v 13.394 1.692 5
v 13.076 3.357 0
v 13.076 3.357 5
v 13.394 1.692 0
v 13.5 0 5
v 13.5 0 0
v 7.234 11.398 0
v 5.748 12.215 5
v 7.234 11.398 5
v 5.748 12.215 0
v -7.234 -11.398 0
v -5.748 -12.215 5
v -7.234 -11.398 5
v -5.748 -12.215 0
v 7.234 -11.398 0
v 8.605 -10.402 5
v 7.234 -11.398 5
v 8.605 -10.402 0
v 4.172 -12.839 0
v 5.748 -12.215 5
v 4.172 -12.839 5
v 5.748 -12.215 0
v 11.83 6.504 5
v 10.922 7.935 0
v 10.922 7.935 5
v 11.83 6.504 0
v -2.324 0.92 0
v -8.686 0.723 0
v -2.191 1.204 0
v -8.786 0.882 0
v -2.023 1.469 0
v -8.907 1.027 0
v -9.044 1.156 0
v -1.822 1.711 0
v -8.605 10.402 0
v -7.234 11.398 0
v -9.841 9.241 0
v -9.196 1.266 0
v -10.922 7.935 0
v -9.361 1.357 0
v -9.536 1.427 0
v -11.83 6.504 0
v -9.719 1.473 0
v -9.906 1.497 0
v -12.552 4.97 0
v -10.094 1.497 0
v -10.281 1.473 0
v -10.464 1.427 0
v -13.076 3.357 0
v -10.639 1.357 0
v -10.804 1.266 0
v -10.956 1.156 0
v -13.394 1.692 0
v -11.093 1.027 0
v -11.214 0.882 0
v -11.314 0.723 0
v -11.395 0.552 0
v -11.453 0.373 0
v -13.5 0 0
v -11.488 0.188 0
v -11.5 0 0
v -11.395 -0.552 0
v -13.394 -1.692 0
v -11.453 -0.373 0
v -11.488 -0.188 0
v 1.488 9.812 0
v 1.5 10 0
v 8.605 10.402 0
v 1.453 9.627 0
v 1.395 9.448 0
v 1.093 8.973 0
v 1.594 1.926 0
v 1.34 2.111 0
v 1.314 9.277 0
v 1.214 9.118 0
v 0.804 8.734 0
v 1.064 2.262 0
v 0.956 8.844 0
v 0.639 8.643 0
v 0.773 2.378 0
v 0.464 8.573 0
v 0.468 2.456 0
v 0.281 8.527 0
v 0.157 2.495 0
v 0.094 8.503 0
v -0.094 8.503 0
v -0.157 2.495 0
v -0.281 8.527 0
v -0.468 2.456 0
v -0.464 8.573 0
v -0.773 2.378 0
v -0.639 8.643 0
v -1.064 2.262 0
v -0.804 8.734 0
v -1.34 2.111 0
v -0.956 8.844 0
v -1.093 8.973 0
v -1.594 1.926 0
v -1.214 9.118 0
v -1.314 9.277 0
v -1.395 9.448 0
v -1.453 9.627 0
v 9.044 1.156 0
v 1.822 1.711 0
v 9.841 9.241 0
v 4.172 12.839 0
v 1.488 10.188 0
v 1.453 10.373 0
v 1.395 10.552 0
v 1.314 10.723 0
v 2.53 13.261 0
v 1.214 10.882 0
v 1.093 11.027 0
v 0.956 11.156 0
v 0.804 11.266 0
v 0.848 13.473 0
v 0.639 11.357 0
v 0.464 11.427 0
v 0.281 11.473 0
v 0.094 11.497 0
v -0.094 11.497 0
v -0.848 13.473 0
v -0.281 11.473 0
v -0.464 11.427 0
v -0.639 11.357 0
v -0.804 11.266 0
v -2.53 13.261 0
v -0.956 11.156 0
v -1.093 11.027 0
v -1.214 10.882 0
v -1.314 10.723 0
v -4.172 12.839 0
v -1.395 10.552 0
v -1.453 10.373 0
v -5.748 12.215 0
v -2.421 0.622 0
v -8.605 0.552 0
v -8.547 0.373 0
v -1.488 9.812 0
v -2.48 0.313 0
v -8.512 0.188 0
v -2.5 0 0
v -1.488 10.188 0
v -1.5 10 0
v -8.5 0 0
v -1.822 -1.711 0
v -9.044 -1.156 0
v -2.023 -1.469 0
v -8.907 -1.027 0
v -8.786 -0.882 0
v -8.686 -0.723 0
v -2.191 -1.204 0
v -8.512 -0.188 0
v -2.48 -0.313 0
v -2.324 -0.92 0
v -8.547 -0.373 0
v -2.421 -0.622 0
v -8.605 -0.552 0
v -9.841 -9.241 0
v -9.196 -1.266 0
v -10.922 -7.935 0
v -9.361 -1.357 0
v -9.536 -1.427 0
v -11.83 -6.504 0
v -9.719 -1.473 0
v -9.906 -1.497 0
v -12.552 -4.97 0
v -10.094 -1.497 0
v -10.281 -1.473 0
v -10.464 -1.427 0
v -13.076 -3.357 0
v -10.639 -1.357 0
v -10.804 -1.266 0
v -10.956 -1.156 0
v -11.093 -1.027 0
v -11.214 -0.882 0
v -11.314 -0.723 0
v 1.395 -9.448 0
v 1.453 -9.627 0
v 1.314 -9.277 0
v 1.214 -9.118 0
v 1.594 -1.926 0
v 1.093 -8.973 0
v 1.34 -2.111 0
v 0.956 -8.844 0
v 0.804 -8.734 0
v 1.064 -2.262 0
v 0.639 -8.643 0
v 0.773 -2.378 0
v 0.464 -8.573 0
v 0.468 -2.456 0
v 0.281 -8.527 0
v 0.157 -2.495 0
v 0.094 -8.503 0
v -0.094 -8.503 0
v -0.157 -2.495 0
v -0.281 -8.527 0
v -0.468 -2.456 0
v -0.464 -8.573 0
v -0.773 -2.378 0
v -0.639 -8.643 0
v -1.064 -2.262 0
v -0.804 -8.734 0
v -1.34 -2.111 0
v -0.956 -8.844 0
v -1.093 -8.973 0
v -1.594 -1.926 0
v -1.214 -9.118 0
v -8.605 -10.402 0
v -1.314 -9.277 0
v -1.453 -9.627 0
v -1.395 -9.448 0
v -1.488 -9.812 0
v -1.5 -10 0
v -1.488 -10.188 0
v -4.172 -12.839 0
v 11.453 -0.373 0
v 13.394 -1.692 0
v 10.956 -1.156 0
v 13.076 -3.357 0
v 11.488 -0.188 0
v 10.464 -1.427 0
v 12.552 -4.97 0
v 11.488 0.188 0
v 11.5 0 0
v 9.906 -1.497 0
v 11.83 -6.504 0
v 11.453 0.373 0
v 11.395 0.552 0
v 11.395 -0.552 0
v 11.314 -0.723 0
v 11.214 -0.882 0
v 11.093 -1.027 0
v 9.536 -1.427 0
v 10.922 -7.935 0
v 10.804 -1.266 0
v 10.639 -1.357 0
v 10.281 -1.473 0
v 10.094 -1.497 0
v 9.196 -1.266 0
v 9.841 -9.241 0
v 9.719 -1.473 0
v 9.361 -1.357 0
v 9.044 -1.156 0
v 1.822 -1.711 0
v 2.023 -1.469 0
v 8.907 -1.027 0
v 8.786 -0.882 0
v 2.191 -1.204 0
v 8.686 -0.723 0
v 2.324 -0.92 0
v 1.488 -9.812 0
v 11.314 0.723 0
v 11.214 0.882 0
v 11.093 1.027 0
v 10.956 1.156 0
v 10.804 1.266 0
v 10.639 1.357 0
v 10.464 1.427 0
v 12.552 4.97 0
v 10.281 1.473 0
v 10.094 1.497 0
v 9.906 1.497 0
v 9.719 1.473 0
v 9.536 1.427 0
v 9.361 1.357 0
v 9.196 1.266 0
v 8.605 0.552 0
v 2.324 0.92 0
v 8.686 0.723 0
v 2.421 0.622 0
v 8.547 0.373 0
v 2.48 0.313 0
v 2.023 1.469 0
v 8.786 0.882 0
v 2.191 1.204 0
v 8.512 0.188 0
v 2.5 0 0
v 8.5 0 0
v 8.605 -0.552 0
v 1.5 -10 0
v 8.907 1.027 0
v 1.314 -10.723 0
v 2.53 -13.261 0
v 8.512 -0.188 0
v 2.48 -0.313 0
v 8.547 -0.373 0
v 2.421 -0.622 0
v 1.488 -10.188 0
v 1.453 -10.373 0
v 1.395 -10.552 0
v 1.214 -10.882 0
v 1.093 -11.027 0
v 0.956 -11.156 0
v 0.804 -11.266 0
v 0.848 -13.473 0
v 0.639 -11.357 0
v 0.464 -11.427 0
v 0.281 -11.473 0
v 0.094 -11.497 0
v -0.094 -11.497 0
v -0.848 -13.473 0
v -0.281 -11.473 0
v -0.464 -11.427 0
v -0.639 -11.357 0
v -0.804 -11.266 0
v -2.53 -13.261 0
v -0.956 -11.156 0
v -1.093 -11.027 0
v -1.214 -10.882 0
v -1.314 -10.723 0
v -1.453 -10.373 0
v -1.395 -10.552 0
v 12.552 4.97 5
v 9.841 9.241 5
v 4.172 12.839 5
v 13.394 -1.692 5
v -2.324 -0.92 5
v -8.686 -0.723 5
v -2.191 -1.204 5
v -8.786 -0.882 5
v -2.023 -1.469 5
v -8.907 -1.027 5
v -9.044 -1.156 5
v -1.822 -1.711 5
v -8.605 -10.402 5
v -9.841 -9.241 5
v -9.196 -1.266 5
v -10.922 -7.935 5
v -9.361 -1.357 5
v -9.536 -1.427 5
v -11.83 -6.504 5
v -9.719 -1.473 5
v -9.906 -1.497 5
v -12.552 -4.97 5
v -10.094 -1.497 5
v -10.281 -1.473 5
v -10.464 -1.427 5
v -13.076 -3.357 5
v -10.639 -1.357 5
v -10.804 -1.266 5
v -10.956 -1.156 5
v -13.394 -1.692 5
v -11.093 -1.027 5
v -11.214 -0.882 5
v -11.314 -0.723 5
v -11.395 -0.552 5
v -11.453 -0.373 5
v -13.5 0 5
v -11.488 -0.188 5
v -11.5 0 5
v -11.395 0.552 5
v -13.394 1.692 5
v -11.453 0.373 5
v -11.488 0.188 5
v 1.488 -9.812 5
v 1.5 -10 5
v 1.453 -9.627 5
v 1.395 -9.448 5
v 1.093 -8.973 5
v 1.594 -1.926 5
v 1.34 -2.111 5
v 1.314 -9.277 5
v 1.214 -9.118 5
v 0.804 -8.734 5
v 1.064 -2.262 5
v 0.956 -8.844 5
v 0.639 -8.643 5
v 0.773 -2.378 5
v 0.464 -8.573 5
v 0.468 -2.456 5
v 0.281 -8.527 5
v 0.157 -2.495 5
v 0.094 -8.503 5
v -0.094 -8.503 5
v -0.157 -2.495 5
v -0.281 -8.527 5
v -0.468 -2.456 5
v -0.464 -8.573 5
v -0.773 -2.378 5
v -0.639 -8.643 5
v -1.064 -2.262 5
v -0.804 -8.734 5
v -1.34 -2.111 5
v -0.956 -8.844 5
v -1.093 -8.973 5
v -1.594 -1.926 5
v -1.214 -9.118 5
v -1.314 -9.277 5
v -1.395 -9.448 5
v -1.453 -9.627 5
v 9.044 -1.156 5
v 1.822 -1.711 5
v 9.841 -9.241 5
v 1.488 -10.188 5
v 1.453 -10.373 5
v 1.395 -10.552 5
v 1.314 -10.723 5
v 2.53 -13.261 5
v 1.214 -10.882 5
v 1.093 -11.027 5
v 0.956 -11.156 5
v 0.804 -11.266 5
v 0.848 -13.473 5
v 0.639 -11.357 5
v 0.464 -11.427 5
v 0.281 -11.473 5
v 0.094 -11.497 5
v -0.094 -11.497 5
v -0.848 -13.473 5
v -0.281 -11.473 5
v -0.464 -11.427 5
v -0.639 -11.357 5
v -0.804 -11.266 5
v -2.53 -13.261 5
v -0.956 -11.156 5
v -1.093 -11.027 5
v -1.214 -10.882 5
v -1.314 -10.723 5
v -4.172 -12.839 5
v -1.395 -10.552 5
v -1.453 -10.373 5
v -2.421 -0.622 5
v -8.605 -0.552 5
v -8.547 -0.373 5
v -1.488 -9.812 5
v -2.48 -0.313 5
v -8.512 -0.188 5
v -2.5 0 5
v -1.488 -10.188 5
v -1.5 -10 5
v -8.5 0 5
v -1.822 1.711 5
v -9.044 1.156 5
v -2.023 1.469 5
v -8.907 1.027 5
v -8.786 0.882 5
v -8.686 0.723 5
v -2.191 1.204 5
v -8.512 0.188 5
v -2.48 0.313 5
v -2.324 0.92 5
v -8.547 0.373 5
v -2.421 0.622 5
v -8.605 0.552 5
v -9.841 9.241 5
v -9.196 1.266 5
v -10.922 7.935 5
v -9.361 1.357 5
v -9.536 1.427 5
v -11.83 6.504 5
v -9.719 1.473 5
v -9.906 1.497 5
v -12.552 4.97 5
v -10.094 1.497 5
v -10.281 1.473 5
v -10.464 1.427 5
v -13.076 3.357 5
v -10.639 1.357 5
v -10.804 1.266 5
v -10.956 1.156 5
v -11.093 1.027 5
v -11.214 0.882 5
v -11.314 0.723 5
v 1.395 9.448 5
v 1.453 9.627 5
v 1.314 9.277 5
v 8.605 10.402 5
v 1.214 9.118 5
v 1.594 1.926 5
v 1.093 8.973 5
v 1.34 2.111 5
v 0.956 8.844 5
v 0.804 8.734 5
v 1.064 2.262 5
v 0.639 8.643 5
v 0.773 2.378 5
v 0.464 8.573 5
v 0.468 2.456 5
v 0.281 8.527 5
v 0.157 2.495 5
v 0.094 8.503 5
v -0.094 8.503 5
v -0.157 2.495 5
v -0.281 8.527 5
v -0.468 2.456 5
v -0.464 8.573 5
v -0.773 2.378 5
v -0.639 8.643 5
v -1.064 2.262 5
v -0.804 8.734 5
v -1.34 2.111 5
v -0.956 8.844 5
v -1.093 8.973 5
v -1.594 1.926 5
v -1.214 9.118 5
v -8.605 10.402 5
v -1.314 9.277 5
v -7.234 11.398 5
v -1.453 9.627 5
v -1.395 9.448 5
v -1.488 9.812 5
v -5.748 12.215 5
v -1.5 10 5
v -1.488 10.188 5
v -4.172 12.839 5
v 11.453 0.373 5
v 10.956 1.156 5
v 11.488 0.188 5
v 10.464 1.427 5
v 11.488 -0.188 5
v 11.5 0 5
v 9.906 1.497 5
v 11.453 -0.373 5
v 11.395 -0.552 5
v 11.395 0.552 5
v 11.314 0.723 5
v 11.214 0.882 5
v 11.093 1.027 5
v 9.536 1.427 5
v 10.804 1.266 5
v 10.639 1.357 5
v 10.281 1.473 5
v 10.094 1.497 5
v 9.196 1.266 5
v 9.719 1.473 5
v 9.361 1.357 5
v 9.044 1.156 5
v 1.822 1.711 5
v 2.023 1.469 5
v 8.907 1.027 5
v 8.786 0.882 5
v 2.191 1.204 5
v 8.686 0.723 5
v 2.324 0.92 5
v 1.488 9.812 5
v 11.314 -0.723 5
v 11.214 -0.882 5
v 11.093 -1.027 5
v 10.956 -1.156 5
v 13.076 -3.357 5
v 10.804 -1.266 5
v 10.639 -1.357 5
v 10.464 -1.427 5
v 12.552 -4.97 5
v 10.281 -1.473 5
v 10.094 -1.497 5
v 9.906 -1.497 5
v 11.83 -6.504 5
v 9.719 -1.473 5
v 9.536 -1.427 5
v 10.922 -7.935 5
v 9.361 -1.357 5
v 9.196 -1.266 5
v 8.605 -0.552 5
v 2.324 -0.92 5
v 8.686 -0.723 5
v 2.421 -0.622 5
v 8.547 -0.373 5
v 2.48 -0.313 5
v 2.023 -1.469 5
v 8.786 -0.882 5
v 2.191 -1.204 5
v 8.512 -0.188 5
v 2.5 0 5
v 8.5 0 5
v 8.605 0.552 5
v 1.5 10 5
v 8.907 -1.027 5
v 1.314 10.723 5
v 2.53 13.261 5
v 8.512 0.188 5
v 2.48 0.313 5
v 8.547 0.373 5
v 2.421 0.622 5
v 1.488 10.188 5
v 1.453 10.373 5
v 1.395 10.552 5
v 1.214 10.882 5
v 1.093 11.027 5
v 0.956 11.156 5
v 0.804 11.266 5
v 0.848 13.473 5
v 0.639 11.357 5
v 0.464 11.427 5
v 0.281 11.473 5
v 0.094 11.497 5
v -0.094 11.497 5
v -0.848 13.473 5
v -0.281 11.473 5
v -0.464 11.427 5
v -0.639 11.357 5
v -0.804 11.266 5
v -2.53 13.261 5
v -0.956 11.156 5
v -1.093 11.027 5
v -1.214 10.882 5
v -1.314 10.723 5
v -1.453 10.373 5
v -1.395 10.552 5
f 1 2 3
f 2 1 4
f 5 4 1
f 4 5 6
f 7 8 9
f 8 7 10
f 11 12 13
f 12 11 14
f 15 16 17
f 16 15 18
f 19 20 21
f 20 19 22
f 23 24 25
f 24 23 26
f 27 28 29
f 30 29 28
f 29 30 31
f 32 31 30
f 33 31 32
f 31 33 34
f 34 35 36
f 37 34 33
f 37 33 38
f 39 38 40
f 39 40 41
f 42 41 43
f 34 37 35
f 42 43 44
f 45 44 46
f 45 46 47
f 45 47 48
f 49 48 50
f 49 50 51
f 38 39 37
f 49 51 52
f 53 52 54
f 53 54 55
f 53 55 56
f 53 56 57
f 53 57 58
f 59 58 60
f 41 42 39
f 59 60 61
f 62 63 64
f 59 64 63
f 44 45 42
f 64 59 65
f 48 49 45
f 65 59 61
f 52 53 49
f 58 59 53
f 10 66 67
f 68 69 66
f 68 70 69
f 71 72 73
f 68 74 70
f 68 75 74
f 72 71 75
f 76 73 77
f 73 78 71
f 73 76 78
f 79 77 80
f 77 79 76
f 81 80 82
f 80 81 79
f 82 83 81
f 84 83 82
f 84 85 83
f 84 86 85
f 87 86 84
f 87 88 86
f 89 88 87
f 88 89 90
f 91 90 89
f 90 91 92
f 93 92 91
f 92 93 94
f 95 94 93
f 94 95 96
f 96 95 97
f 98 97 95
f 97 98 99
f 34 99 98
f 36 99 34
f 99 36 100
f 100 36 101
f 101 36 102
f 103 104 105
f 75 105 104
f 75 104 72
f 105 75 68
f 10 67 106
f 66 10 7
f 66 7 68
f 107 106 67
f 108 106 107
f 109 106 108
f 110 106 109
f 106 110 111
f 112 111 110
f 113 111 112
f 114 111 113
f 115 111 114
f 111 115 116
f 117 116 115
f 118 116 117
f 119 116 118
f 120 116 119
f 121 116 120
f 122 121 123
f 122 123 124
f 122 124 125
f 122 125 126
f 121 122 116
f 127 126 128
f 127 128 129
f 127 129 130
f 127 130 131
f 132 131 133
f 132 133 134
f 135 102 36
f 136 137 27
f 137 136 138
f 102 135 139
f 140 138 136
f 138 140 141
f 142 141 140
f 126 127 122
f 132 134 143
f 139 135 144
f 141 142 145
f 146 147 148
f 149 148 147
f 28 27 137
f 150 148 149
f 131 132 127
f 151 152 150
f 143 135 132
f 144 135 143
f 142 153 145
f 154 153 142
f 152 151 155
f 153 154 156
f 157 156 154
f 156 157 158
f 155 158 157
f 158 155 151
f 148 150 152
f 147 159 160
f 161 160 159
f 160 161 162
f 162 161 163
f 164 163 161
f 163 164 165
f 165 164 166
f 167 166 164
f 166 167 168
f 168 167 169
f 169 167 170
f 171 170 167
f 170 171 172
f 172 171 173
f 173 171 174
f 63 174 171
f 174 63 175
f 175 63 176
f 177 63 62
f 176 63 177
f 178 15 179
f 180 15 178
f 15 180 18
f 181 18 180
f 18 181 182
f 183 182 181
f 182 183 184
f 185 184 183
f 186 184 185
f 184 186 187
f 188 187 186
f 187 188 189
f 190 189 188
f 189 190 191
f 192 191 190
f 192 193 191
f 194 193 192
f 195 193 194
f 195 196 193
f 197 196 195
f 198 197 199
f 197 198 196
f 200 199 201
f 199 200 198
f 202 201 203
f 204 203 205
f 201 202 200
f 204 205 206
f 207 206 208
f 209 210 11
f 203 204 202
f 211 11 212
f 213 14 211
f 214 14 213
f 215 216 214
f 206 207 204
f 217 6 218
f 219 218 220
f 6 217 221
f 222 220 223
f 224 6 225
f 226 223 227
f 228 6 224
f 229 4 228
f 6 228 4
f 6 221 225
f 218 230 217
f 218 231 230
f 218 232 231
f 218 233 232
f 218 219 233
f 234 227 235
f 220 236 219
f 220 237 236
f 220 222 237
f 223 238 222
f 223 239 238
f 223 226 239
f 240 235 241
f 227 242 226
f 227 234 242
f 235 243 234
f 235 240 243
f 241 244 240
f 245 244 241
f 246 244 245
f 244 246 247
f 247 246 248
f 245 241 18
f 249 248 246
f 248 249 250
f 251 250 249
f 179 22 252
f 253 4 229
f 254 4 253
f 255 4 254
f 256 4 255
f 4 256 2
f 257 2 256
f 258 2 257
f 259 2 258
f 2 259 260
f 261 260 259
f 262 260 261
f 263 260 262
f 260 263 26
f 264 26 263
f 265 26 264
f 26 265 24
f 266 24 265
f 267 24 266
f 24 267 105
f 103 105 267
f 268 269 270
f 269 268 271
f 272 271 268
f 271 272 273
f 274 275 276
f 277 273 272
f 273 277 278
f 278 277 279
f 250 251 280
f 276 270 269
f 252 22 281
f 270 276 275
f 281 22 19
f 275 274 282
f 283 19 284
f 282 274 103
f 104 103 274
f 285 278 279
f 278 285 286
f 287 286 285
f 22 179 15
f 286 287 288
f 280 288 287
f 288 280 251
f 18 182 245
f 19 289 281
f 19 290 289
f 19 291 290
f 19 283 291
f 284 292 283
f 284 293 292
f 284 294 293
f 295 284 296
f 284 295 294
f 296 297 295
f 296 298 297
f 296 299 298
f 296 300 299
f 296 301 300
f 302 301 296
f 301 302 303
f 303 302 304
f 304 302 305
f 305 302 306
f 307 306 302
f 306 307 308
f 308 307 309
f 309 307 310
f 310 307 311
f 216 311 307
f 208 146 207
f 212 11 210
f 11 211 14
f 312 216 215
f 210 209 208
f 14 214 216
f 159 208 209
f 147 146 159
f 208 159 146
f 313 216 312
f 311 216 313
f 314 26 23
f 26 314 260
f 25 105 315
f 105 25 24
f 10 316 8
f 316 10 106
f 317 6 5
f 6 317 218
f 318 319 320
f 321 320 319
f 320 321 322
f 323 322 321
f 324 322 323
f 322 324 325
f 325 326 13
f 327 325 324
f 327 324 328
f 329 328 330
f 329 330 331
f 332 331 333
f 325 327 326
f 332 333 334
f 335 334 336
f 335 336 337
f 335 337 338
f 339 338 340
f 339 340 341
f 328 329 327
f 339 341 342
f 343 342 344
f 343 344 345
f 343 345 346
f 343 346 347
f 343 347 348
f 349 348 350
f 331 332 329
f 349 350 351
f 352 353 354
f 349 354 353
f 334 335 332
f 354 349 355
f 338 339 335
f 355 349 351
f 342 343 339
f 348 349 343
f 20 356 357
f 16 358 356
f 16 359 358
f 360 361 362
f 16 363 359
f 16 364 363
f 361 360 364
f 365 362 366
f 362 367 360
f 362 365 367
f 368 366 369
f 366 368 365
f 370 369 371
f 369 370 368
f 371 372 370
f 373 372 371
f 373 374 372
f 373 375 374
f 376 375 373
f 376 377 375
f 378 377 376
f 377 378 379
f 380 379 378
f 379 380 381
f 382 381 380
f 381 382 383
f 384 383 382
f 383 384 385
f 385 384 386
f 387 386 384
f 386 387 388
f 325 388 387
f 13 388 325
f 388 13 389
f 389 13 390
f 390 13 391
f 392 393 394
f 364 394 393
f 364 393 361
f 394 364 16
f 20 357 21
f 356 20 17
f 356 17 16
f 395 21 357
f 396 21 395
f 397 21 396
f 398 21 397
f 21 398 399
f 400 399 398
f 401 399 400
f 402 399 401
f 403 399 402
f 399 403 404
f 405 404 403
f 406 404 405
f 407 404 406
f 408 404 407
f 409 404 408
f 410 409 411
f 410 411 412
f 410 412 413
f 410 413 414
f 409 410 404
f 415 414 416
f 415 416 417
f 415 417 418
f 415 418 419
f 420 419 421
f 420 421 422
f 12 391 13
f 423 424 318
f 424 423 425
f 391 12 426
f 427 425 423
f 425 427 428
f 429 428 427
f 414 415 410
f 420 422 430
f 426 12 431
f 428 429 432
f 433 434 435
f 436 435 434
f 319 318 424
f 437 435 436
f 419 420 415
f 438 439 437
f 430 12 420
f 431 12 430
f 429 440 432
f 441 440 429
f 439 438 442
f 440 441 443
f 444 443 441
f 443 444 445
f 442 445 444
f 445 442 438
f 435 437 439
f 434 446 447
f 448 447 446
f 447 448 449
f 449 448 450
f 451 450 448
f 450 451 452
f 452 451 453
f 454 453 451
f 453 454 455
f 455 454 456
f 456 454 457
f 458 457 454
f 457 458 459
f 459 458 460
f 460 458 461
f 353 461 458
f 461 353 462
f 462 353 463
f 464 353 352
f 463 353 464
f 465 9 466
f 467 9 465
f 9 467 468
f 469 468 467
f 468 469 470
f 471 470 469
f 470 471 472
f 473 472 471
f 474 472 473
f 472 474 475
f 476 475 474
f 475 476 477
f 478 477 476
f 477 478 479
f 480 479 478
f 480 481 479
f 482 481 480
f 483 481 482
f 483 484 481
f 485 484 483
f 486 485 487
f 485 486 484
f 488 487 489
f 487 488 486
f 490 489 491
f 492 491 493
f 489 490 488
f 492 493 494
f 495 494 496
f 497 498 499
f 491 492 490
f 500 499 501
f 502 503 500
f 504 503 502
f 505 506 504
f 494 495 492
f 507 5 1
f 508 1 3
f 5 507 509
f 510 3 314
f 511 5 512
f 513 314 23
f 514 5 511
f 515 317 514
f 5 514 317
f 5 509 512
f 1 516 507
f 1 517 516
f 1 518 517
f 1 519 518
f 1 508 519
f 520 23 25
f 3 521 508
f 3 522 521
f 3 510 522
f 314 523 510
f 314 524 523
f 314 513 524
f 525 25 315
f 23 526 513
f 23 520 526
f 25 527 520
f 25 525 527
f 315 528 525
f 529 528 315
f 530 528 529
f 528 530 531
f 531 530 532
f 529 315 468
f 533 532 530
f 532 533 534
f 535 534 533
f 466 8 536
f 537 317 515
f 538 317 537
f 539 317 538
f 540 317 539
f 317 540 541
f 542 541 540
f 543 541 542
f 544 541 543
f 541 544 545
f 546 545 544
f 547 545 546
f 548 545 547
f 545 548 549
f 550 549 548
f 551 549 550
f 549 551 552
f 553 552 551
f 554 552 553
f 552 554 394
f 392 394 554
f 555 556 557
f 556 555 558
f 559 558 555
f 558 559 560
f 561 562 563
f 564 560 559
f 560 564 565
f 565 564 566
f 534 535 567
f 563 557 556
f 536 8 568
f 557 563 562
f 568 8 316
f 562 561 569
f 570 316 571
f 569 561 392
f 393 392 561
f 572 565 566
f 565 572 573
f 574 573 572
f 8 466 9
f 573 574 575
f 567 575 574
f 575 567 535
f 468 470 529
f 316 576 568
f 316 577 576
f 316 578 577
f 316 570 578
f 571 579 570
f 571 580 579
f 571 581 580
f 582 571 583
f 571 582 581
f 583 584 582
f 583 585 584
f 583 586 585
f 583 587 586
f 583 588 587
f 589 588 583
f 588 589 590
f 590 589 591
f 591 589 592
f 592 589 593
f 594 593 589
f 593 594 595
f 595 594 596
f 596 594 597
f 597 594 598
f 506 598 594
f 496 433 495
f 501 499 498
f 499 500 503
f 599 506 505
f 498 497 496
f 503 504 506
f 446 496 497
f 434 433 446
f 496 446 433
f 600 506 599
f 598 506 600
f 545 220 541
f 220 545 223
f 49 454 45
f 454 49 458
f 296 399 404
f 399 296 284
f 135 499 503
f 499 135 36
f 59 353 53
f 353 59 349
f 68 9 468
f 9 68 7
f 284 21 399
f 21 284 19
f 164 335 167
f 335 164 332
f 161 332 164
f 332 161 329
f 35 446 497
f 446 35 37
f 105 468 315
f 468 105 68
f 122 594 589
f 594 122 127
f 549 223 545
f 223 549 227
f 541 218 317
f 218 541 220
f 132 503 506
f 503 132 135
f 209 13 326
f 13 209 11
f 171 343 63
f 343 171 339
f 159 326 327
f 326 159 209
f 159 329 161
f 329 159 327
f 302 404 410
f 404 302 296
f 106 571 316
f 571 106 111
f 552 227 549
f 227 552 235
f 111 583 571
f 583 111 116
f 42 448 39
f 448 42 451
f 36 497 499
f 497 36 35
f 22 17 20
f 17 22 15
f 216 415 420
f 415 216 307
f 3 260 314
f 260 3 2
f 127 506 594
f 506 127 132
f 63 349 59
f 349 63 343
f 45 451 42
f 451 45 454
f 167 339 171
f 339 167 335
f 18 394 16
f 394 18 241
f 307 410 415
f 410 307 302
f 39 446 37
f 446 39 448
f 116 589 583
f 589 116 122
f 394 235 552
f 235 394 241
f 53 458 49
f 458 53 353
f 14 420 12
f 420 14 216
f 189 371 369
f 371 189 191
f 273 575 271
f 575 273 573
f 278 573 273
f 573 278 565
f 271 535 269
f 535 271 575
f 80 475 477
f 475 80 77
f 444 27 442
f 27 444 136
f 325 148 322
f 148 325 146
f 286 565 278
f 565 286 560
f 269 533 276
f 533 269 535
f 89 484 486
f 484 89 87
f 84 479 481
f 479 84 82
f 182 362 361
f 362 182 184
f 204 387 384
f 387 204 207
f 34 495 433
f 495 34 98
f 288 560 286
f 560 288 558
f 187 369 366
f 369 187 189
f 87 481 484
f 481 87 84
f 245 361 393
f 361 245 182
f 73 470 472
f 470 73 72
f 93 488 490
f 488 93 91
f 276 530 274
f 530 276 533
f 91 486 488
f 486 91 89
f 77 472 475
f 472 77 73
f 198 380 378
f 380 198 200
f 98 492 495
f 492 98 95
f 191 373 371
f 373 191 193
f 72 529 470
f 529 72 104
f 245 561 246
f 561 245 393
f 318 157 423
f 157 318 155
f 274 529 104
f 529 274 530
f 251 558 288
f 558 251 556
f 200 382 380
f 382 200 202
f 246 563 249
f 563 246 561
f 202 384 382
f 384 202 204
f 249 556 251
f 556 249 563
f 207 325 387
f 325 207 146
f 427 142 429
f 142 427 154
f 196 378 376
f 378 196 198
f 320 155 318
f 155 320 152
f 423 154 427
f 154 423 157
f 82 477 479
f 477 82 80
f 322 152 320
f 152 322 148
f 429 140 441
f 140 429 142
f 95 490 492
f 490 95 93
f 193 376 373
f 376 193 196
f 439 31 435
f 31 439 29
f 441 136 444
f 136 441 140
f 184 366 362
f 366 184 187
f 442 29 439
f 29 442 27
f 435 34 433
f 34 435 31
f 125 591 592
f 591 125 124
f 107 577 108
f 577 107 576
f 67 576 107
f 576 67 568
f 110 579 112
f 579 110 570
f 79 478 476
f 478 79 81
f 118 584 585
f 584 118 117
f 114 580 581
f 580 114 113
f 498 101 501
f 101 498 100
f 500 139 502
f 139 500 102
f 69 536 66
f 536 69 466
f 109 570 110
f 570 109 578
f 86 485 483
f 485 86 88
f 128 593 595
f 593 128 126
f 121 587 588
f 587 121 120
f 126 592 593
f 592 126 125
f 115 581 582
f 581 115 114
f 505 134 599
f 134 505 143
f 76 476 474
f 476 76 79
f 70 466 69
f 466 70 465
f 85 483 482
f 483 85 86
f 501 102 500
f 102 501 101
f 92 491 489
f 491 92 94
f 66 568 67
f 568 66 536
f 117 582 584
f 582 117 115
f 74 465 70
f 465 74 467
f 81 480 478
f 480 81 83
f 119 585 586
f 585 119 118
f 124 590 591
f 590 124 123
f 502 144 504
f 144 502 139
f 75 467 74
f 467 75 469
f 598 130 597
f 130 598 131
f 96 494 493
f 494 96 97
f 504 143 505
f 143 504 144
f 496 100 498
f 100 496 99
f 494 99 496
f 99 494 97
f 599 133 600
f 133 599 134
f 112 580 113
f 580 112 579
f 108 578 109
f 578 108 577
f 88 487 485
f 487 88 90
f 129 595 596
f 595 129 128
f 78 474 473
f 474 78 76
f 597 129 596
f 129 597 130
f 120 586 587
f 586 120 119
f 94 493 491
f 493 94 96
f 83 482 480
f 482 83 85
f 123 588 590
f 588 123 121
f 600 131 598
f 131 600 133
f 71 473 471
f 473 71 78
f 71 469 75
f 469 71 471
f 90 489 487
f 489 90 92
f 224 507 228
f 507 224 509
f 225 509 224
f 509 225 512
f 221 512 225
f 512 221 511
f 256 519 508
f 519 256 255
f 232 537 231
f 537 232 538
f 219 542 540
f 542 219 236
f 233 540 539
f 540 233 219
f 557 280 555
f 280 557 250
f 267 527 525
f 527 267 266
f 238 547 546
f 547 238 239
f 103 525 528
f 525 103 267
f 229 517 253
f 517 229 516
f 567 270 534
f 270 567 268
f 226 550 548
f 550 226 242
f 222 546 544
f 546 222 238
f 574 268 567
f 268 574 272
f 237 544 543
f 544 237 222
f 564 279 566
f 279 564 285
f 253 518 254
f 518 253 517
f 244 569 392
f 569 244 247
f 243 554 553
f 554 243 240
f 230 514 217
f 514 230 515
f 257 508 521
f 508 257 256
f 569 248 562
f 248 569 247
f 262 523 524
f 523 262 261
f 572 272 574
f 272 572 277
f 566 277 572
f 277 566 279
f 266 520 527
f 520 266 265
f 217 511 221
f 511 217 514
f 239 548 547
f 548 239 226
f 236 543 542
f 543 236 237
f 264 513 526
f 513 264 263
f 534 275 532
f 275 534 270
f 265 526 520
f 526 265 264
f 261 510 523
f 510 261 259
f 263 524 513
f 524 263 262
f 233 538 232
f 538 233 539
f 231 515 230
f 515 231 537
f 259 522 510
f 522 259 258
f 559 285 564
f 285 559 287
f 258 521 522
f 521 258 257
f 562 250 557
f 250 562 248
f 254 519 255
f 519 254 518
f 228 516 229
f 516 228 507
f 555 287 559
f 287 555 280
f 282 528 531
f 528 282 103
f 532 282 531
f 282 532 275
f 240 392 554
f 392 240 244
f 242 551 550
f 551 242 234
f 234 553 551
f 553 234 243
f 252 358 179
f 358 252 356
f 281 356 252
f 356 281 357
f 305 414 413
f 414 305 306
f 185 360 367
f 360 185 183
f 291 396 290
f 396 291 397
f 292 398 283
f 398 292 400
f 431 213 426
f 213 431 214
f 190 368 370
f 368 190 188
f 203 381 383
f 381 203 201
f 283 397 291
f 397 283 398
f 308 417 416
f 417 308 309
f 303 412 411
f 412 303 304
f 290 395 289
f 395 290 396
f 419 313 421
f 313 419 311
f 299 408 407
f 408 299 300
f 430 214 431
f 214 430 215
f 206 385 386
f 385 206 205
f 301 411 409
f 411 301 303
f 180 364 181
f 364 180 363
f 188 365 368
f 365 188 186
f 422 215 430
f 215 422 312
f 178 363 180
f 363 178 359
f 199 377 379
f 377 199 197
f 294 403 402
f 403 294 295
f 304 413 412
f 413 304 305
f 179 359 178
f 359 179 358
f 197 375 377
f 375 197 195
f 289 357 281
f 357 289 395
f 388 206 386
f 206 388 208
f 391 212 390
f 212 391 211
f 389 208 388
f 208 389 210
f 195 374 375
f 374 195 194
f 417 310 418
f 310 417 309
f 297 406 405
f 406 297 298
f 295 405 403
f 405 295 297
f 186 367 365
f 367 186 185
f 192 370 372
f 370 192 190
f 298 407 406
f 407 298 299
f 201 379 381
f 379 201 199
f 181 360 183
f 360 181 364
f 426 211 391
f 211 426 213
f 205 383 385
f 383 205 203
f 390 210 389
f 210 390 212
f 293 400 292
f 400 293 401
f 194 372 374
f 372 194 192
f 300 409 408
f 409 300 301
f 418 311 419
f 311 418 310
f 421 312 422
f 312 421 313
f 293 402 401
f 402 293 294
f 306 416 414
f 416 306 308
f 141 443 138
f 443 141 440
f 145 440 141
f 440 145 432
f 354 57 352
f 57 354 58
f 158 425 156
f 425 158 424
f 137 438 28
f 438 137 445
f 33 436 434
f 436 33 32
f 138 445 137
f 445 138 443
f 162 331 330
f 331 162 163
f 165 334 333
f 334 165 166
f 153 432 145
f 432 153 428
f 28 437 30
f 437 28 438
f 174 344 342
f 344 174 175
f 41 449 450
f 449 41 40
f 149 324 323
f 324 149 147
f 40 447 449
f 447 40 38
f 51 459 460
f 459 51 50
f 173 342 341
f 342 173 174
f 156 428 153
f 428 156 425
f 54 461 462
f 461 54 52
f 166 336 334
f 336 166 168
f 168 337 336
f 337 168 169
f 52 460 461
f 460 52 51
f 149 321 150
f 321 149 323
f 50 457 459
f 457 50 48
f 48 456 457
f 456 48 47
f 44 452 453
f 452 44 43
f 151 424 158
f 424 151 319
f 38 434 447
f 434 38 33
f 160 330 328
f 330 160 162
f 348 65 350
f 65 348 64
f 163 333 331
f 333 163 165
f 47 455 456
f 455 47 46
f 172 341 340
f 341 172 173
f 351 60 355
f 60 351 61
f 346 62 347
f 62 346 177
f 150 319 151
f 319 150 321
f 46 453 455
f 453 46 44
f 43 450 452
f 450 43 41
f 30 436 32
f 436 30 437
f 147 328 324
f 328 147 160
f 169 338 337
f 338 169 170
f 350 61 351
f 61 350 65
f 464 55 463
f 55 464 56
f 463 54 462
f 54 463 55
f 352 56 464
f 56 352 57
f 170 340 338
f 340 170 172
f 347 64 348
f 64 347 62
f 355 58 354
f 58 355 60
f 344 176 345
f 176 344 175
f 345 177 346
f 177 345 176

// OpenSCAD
difference() {
     cylinder(d=27, h=5, $fn=50);
     translate([0,0,-4]) cylinder(d=5, h=40, $fn=50);
     translate([0,10,-4]) cylinder(d=3, h=40, $fn=50);
     translate([10,0,-4]) cylinder(d=3, h=40, $fn=50);
     translate([0,-10,-4]) cylinder(d=3, h=40, $fn=50);
     translate([-10,0,-4]) cylinder(d=3, h=40, $fn=50);
}
